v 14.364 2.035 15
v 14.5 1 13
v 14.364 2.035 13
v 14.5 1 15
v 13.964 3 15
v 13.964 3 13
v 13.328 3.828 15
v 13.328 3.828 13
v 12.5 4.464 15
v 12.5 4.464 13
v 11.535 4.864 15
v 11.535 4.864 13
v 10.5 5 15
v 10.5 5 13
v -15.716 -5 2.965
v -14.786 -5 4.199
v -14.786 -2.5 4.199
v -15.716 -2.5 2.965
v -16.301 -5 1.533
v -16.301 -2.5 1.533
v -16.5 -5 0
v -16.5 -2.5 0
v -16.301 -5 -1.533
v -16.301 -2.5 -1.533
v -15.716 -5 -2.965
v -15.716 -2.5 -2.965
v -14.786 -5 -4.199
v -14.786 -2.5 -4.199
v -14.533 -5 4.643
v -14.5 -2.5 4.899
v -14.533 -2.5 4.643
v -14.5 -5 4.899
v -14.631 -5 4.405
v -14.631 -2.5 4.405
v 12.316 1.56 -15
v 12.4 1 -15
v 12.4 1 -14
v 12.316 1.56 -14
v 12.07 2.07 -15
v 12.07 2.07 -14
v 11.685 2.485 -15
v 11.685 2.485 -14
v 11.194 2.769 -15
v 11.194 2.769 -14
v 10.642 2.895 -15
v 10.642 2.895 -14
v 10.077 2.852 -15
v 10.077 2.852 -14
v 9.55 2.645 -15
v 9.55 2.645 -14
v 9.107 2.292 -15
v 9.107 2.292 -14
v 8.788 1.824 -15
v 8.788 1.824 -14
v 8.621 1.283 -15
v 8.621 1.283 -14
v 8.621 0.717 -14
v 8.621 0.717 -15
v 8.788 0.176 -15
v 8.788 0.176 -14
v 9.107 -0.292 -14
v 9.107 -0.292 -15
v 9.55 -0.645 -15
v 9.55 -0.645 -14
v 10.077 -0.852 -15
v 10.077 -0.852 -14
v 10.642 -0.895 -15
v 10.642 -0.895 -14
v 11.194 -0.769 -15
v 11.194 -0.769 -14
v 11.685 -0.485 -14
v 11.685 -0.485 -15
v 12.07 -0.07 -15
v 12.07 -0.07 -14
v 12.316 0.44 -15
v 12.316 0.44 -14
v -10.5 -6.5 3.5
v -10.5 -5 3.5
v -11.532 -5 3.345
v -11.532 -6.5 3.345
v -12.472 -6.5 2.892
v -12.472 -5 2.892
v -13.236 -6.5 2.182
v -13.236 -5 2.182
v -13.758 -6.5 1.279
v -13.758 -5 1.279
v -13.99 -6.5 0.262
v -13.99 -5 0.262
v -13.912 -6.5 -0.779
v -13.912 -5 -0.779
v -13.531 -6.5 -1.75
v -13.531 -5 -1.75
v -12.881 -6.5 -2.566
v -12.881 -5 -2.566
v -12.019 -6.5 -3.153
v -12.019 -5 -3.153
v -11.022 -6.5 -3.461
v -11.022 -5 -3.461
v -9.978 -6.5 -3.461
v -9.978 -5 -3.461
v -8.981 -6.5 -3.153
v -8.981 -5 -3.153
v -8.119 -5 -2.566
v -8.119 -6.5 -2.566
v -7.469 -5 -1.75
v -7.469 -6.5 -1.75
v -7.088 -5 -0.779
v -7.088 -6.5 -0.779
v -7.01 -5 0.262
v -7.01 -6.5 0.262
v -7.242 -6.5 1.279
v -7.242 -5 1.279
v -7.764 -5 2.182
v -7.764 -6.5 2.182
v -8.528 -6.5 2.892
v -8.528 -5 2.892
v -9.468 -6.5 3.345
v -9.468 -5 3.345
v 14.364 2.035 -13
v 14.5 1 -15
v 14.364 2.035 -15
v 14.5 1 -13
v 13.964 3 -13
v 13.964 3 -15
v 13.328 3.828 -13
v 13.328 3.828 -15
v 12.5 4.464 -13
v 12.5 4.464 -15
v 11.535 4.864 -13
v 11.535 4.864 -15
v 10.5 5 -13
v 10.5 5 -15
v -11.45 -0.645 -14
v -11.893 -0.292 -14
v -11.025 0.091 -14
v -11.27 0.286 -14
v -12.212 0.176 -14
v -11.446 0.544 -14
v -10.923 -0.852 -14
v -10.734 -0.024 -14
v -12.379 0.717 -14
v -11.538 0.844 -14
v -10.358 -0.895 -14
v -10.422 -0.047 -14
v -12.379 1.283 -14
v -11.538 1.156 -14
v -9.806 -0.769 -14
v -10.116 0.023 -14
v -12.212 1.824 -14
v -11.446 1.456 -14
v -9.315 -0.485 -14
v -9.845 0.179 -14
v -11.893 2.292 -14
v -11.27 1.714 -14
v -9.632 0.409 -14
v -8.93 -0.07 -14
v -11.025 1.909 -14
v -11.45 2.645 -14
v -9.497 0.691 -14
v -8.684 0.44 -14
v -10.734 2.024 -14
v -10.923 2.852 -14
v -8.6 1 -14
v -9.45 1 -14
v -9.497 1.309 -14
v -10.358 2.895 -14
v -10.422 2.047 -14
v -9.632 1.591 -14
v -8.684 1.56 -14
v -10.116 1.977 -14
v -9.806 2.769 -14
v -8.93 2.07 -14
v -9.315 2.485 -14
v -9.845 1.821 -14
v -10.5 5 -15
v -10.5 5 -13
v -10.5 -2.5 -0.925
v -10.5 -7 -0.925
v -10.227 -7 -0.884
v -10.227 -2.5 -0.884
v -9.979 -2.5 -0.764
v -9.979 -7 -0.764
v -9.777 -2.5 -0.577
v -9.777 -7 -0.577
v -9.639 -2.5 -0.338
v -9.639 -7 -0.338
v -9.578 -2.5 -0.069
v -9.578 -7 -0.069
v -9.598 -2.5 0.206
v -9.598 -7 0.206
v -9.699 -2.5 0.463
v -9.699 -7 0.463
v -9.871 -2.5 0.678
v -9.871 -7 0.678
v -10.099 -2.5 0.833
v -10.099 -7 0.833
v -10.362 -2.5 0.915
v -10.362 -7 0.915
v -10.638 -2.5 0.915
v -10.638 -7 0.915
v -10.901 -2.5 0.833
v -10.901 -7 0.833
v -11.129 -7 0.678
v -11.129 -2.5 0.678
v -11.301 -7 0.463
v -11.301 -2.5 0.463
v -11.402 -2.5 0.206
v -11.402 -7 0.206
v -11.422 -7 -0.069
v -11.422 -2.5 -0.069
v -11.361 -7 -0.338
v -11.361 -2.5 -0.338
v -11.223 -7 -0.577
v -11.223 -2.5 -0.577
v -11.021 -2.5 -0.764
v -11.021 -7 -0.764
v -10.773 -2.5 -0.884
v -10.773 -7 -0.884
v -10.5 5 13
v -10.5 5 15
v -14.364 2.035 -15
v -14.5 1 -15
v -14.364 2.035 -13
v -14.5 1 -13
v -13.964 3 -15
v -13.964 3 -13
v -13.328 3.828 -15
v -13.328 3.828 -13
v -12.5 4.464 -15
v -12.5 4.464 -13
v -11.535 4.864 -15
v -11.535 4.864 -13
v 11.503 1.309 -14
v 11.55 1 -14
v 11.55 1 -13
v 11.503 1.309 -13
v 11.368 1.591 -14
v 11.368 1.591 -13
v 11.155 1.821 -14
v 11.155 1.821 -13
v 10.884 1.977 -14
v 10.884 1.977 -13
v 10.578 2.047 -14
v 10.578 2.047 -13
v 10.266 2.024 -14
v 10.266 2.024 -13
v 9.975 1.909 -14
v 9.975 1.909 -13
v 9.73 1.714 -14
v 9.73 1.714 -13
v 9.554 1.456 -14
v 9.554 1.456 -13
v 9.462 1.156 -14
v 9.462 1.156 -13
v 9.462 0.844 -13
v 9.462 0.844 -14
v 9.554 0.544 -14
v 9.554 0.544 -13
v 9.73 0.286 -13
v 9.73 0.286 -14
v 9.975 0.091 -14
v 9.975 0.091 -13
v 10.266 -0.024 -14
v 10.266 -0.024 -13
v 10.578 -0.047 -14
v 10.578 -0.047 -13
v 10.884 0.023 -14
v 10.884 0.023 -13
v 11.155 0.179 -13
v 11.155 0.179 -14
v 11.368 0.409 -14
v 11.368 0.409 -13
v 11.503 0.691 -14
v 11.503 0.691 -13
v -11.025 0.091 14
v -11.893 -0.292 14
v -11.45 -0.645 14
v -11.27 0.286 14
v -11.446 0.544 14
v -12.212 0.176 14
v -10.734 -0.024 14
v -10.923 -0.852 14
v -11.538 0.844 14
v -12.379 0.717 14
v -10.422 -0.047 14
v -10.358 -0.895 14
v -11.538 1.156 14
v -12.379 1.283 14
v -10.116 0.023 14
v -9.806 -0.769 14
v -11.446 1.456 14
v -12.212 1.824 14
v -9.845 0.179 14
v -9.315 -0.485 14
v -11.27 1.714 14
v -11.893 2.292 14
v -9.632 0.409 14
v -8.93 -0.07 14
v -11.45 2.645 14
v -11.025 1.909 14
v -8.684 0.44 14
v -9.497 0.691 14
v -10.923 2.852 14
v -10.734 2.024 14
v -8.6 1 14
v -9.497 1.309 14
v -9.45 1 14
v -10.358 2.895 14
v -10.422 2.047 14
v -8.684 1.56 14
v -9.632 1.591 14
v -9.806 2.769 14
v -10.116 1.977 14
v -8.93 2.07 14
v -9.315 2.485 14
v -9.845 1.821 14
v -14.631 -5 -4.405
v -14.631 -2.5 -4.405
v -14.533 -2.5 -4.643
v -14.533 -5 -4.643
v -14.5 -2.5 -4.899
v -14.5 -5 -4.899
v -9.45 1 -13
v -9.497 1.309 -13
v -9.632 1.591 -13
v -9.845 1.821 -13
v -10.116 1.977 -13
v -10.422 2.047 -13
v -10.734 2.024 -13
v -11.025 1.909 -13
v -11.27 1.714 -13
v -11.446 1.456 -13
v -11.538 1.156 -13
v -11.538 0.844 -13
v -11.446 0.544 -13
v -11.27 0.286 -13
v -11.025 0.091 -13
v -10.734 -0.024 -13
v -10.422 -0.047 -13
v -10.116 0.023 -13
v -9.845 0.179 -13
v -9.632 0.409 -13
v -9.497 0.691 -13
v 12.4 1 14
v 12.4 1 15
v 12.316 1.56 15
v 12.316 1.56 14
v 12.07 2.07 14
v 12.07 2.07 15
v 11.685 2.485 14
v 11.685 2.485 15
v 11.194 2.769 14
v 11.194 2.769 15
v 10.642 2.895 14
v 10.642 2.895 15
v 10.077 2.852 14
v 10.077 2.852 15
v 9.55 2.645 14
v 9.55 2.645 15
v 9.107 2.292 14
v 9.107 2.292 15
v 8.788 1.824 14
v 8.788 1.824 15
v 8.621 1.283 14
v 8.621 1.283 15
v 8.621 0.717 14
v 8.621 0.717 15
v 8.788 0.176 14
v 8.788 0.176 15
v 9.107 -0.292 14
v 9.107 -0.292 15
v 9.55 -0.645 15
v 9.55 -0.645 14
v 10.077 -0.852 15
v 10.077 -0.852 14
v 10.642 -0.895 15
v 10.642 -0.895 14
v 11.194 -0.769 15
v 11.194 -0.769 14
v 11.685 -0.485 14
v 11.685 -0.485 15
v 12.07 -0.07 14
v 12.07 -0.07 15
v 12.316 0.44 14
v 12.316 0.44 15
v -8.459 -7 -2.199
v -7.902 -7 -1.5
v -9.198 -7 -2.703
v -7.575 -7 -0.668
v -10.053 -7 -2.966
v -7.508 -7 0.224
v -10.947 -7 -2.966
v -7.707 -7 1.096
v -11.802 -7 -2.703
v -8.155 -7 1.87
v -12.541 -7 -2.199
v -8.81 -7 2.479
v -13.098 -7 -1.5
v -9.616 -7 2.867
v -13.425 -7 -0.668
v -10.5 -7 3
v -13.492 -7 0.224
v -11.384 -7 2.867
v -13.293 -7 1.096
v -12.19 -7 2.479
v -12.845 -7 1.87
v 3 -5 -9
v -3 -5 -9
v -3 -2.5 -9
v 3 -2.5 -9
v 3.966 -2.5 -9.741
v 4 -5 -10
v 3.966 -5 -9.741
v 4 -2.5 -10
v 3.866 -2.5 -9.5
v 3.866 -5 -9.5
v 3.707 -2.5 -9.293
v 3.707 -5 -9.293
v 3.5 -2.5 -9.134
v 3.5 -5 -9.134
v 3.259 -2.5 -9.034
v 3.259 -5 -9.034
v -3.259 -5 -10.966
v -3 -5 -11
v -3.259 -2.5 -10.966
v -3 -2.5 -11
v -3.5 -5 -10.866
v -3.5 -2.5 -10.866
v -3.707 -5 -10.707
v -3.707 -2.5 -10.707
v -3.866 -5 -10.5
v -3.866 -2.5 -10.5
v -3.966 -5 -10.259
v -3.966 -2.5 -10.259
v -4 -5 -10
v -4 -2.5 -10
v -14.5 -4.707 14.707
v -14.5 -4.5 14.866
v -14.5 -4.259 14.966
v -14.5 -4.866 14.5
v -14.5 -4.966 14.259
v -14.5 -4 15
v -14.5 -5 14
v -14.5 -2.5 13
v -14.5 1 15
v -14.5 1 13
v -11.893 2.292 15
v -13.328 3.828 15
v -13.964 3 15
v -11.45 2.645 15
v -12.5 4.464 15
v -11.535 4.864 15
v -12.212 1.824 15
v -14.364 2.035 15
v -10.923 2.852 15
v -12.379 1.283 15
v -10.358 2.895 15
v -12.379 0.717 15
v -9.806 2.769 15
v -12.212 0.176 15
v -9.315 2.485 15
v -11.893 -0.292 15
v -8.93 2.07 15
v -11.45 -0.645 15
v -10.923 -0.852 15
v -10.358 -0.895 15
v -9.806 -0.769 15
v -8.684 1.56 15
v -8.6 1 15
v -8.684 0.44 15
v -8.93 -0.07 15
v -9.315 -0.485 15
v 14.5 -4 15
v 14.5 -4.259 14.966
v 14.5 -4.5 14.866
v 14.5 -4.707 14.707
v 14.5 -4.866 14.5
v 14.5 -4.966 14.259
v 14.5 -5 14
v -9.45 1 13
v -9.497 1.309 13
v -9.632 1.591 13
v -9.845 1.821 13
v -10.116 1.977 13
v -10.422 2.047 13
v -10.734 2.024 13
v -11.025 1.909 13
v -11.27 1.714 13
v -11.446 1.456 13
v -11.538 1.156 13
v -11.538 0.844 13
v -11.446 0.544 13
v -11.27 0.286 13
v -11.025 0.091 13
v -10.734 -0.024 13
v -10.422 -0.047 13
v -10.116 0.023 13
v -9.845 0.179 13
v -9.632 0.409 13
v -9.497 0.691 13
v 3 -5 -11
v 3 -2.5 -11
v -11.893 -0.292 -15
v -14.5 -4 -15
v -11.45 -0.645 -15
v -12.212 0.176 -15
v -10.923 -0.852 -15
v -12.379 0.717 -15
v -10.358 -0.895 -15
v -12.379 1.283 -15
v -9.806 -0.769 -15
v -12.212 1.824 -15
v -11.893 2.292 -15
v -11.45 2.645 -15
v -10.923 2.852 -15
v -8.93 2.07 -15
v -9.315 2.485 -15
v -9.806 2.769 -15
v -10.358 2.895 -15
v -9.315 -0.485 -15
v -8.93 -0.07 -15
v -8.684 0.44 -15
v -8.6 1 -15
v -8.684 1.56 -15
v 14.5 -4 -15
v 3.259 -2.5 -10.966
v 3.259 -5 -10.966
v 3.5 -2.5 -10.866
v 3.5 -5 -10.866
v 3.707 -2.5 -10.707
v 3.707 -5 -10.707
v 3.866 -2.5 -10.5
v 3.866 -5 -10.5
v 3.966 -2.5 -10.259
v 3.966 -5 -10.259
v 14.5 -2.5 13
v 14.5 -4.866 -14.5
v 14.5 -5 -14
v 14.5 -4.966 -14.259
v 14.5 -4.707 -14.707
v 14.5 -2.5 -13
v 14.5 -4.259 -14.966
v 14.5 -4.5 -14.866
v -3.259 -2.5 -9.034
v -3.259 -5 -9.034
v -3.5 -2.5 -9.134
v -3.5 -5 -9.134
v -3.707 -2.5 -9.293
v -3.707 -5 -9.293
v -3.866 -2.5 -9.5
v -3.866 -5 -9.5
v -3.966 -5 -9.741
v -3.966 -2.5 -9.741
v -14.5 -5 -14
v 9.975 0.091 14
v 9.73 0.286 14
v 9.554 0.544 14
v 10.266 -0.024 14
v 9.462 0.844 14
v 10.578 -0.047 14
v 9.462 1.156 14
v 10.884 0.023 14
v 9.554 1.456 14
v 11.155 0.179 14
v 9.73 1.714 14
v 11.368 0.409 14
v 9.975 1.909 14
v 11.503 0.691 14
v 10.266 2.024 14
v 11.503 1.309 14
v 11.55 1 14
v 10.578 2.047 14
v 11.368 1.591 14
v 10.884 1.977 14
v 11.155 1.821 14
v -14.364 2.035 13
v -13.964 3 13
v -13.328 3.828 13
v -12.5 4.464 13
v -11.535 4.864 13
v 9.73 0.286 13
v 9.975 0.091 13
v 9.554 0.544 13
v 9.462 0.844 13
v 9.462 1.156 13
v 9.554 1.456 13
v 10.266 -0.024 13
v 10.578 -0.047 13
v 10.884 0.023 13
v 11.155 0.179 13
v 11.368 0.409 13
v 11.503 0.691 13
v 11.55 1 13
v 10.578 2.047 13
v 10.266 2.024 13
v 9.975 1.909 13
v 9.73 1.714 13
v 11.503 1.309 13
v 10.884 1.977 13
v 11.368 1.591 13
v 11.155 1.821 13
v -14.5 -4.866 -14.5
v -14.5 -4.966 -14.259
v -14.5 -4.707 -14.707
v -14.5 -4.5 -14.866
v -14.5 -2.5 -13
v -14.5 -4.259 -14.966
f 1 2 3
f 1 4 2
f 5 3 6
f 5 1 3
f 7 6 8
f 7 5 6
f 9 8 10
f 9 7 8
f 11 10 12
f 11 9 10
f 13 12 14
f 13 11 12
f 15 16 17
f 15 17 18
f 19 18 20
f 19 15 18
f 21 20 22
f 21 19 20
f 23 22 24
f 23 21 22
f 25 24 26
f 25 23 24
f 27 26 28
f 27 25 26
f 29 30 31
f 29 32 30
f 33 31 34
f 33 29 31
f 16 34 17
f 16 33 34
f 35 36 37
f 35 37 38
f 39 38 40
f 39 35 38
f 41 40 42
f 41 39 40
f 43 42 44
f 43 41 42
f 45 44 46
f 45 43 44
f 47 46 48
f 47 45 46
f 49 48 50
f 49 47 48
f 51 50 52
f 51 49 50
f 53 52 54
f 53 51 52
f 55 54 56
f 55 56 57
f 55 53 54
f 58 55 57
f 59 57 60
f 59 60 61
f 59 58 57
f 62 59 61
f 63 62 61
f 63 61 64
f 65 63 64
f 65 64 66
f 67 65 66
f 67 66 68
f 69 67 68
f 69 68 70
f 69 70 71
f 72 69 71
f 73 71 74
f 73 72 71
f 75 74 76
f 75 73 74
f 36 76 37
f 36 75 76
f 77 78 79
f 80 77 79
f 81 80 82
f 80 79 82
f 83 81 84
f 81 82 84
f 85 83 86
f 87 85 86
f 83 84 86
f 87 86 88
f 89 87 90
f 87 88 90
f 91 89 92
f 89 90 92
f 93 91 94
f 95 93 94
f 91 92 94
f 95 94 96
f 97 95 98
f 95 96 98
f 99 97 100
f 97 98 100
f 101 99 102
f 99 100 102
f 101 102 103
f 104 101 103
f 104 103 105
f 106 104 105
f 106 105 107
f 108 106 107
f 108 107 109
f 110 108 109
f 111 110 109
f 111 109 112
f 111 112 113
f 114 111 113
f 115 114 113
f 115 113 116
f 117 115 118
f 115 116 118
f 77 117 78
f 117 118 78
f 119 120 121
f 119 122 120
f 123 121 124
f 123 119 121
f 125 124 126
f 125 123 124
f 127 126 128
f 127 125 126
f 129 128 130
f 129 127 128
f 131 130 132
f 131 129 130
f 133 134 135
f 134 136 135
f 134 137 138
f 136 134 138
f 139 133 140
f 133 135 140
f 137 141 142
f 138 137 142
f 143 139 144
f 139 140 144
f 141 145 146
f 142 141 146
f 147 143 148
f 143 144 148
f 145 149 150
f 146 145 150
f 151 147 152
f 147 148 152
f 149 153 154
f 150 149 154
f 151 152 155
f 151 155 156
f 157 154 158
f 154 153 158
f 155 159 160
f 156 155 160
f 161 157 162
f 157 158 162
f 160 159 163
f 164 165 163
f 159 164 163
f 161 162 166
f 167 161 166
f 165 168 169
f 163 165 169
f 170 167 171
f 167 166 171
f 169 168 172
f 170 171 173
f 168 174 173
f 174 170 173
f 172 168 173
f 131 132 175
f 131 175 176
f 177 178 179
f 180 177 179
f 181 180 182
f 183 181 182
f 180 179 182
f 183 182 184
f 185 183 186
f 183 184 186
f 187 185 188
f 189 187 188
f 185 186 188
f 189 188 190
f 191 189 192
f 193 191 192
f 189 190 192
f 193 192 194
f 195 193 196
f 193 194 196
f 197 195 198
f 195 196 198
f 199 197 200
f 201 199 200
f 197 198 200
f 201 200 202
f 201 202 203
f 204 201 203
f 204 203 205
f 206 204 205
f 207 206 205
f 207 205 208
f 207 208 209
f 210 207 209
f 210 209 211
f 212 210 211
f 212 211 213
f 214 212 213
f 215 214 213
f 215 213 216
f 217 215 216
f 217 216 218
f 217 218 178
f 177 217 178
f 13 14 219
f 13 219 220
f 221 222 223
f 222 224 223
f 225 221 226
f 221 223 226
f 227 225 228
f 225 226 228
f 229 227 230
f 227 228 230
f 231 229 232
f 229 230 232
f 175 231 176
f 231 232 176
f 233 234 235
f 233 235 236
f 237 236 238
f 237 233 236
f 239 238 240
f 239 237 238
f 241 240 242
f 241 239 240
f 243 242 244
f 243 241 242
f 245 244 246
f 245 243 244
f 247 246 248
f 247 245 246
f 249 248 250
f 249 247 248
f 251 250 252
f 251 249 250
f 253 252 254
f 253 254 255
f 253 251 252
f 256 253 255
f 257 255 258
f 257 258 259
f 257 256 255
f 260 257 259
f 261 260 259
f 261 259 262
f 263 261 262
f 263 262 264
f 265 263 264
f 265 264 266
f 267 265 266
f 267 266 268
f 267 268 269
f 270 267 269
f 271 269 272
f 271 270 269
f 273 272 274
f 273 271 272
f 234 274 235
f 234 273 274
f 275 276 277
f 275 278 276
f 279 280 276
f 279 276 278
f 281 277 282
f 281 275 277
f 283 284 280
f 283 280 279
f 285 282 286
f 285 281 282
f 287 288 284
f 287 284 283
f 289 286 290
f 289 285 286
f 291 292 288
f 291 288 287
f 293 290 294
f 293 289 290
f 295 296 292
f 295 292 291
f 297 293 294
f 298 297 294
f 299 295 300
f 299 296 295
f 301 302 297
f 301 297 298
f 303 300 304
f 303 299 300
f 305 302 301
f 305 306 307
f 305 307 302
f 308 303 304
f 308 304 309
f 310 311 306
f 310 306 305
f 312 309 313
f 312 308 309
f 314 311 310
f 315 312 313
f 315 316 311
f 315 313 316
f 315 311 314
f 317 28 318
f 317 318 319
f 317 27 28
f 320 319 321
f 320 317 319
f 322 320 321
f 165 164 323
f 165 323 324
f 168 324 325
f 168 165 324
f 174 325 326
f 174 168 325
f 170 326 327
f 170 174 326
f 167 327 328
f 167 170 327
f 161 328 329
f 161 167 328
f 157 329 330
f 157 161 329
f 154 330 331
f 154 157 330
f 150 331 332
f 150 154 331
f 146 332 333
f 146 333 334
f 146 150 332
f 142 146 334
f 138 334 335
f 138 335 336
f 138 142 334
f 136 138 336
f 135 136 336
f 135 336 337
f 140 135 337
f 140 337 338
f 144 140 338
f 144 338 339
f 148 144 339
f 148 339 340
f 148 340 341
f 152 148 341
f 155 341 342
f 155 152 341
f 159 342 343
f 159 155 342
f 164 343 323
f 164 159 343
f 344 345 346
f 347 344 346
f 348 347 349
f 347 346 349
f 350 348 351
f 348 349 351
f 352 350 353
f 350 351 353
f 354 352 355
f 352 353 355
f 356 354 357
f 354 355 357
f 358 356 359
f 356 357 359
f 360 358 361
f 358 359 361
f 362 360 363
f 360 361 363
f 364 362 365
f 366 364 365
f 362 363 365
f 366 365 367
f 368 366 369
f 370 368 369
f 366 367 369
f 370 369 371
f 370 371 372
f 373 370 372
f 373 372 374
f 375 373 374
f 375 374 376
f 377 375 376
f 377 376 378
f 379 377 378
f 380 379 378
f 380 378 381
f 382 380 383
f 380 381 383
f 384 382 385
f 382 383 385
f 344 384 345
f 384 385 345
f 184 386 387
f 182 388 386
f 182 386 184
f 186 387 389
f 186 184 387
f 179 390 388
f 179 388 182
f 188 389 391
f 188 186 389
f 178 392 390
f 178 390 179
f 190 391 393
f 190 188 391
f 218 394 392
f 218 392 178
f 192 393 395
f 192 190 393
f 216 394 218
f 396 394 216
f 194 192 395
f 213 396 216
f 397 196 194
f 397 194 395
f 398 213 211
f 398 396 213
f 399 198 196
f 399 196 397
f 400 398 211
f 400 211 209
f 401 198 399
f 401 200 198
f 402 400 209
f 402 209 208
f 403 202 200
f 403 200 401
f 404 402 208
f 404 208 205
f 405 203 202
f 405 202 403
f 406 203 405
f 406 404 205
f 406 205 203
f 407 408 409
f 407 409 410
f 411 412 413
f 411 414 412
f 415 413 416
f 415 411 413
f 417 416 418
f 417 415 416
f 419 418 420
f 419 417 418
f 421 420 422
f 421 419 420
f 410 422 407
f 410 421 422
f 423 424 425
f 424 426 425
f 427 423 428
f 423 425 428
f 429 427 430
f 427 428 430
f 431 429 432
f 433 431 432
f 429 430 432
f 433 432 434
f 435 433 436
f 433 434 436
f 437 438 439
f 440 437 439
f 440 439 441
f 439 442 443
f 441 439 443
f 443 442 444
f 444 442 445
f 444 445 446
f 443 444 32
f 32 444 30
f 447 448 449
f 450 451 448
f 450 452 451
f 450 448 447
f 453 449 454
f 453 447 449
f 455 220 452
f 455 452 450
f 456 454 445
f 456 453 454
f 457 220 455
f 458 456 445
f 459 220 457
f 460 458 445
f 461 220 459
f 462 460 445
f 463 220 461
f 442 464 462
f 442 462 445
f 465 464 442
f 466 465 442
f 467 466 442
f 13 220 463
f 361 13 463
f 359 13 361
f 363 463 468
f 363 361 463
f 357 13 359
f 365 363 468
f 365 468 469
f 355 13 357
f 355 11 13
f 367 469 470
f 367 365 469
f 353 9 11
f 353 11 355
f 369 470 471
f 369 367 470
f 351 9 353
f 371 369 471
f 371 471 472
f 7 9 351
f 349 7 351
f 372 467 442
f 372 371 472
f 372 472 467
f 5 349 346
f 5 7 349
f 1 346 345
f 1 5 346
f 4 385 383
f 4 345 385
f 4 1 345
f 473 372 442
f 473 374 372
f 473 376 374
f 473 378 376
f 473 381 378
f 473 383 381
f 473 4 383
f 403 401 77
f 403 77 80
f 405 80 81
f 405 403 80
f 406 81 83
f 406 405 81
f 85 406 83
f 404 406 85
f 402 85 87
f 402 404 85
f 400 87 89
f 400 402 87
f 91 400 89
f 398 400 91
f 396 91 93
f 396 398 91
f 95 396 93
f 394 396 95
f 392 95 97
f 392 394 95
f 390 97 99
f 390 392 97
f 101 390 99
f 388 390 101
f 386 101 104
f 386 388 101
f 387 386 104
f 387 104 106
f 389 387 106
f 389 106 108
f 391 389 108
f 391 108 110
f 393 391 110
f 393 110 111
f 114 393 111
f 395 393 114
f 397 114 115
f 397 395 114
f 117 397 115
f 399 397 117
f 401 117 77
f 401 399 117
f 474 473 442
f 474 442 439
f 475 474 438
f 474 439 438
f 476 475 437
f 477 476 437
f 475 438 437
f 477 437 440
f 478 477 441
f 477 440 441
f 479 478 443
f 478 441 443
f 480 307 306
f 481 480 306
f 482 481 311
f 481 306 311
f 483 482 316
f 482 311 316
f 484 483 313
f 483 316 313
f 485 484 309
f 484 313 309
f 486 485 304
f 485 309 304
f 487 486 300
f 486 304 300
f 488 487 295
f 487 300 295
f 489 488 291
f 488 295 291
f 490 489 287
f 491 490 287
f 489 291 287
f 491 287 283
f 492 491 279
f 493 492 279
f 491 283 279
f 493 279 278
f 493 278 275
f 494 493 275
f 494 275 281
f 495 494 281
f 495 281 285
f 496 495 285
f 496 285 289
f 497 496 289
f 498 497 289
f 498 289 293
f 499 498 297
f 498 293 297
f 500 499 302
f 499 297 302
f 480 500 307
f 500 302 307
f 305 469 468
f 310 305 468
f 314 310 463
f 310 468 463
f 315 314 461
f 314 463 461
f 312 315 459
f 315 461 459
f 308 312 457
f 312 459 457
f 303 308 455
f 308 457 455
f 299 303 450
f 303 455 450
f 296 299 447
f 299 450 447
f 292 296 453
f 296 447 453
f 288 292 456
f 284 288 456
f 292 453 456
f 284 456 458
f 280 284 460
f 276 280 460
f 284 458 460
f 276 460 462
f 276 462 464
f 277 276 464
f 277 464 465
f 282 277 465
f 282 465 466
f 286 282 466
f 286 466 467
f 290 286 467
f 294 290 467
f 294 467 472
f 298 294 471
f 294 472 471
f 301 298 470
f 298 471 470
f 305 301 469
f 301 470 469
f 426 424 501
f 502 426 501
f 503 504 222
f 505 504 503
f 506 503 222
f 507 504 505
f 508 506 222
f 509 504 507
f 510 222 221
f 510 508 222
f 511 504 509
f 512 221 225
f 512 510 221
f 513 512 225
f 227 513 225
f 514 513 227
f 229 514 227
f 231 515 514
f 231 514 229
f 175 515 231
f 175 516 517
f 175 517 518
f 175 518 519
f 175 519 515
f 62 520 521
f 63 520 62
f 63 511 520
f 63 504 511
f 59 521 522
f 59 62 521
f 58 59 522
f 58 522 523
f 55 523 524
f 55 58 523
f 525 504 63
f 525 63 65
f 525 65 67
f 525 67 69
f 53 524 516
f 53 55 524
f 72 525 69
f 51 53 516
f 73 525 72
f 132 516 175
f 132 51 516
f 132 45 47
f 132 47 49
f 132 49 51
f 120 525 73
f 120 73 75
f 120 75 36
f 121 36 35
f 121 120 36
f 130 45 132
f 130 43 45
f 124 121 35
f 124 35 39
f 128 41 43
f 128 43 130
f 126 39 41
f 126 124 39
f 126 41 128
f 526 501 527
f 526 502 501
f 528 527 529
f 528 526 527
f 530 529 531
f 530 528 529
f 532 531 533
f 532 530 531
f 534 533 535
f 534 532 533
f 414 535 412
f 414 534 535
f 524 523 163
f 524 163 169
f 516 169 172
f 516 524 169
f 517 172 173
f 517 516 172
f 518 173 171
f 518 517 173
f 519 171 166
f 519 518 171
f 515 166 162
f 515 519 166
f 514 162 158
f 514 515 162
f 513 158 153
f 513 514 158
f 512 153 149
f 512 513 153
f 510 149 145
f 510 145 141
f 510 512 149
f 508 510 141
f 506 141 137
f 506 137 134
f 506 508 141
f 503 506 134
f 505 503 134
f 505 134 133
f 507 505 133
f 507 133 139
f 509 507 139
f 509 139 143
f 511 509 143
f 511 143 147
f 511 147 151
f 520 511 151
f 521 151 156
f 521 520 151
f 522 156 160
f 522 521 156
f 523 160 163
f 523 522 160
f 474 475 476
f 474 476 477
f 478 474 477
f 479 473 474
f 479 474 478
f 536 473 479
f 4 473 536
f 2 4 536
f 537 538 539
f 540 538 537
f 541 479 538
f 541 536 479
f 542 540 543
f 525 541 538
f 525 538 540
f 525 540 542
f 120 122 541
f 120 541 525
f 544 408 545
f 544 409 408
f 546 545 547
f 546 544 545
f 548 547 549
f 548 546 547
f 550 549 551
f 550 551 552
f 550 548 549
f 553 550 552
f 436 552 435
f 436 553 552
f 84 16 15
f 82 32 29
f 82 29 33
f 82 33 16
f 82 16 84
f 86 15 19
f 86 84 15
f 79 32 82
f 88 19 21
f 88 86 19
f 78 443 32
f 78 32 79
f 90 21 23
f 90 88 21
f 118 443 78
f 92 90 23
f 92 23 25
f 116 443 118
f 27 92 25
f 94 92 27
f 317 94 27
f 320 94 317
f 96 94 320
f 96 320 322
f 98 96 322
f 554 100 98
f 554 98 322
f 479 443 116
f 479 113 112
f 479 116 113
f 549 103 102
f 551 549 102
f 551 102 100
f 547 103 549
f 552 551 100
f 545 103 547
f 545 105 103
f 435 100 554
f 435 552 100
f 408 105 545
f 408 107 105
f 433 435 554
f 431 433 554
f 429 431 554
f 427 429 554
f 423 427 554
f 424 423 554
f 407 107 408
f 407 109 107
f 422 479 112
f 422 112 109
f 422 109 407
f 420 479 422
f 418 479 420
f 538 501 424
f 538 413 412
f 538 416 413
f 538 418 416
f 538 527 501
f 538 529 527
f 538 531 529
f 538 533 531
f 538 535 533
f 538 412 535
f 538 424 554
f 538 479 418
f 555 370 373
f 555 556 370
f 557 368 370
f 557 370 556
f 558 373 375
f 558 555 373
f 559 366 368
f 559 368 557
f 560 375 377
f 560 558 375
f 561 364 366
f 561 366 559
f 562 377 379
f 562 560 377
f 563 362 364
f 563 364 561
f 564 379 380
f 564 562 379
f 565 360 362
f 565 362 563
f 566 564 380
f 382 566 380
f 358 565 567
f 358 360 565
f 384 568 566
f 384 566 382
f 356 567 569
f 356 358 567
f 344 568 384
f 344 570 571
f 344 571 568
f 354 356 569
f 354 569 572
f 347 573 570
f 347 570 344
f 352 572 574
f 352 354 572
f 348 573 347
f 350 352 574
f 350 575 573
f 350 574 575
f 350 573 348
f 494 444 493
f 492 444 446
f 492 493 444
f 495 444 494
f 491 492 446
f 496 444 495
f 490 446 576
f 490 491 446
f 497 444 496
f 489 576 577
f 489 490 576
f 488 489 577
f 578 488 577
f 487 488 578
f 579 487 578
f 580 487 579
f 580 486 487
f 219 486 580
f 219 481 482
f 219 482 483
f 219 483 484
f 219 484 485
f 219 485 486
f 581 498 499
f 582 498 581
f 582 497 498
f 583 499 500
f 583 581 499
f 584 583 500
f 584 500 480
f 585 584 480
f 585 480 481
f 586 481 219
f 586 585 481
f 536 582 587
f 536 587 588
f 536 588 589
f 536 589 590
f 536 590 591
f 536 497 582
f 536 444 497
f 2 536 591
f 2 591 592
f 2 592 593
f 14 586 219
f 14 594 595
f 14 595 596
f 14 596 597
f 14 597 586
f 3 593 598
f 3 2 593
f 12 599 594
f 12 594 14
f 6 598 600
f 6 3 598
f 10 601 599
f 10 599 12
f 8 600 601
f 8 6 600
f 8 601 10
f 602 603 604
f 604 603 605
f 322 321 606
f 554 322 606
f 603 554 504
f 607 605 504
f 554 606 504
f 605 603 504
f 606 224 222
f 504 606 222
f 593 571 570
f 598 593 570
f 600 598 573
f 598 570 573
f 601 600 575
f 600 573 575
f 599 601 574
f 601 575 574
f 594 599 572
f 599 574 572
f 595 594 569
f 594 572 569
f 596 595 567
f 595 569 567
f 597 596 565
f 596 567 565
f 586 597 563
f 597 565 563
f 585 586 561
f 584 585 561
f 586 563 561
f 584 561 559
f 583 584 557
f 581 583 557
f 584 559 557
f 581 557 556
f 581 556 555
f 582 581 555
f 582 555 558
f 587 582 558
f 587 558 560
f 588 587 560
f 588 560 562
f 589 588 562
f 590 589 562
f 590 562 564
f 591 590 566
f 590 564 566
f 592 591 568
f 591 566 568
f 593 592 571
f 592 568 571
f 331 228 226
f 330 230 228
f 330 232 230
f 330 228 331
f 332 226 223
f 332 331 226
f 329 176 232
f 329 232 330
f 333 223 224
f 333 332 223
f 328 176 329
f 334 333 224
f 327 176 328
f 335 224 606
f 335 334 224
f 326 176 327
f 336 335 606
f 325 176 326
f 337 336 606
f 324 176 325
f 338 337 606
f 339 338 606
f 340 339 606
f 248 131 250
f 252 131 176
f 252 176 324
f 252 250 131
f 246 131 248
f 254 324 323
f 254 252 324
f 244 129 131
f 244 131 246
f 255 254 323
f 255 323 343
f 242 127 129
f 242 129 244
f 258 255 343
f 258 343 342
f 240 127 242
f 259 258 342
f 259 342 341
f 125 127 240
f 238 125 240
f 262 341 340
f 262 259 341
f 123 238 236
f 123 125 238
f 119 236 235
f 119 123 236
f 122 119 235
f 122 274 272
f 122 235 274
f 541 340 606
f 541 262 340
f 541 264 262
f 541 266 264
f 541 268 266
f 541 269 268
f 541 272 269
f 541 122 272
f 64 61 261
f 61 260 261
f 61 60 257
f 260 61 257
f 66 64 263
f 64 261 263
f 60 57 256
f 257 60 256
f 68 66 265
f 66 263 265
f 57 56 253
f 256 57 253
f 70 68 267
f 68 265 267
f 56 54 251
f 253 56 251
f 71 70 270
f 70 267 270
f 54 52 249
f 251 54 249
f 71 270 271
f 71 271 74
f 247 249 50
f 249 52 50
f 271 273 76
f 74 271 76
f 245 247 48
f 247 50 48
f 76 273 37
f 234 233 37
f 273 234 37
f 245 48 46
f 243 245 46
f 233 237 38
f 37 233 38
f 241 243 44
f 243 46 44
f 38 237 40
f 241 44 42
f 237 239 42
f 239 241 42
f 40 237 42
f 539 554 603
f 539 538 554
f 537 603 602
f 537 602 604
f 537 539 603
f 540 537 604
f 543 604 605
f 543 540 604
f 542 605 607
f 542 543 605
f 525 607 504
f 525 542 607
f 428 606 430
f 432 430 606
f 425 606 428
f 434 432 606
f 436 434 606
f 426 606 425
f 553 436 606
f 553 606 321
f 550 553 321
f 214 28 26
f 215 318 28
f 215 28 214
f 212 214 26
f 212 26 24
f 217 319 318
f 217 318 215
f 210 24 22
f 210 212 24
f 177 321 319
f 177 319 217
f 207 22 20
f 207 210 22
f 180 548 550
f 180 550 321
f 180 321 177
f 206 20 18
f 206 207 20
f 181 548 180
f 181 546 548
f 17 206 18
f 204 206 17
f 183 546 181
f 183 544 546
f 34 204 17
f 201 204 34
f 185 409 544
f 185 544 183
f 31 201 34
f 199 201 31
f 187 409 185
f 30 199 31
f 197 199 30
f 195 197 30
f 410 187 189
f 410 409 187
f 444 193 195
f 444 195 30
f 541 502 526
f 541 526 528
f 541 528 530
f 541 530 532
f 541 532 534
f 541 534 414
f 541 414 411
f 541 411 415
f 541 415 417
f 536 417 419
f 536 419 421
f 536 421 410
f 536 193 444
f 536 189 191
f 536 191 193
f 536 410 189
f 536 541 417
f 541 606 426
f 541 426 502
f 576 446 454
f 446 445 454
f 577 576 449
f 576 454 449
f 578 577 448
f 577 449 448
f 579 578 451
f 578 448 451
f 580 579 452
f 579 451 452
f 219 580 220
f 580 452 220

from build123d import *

# Parameters (mm, degrees)
EXTRUDE_1_DEPTH              = 14.5
HOLE_START                   = -15
HOLE_WIZARD_M2_1_OUTLINE_R   = 1.9
HOLE_WIZARD_M2_1_DEPTH       = 1
HOLE_START_2                 = -14
HOLE_WIZARD_M2_1_2_OUTLINE_R = 1.05
HOLE_WIZARD_M2_1_2_DEPTH     = 1
SKETCH_5_R                   = 6
EXTRUDE_2_DEPTH              = 2.5
SKETCH_6_R                   = 3.5
EXTRUDE_3_DEPTH              = 2
CHAMFER_1_SIZE               = 0.5
CUT_EXTRUDE_1_REACH          = 27.323
SKETCH_7_R                   = 0.925
FILLET_1_R                   = 4
FILLET_2_R                   = 1
CUT_EXTRUDE_2_REACH          = 26.439
SKETCH_8_W                   = 8
SKETCH_8_H                   = 2
FILLET_3_R                   = 1


# Read off the part's stored shape, not the designer's step: M2 丸平ねじ用座ぐり穴1
with BuildPart() as part:
    # ｽｹｯﾁ1 → ﾎﾞｽ - 押し出し1 (new, symmetric)
    with BuildSketch(Plane(origin=(0, 0, 0), x_dir=(0, 0, -1), z_dir=(1, 0, 0))):
        Polygon((-15, -5), (15, -5), (15, 5), (13, 5), (13, -2.5), (-13, -2.5), (-13, 5), (-15, 5), align=None)
    extrude(amount=EXTRUDE_1_DEPTH, both=True)

    # M2 丸平ねじ用座ぐり穴1 outline → M2 丸平ねじ用座ぐり穴1 (cut)
    with BuildSketch(Plane.XY.offset(HOLE_START)):
        with Locations((-10.5, 1)):
            Circle(HOLE_WIZARD_M2_1_OUTLINE_R)
        with Locations((10.5, 1)):
            Circle(HOLE_WIZARD_M2_1_OUTLINE_R)
    hole_wizard_m2_1 = extrude(amount=HOLE_WIZARD_M2_1_DEPTH, mode=Mode.SUBTRACT)

    # Hole Wizard M2 _1 2 outline → Hole Wizard M2 _1 2 (cut)
    with BuildSketch(Plane.XY.offset(HOLE_START_2)):
        with Locations((-10.5, 1)):
            Circle(HOLE_WIZARD_M2_1_2_OUTLINE_R)
        with Locations((10.5, 1)):
            Circle(HOLE_WIZARD_M2_1_2_OUTLINE_R)
    hole_wizard_m2_1_2 = extrude(amount=HOLE_WIZARD_M2_1_2_DEPTH, mode=Mode.SUBTRACT)

    # ｽｹｯﾁ5 → ﾎﾞｽ - 押し出し2 (add)
    with BuildSketch(Plane.XZ.offset(5)):
        with Locations((-10.5, 0)):
            Circle(SKETCH_5_R)
    extrude(amount=-EXTRUDE_2_DEPTH)

    # ｽｹｯﾁ6 → ﾎﾞｽ - 押し出し3 (add)
    with BuildSketch(Plane.XZ.offset(5)):
        with Locations(Location((-10.5, 0, 0), (0, 0, 90))):
            Circle(SKETCH_6_R)
    extrude(amount=EXTRUDE_3_DEPTH)

    # 面取り1
    chamfer_1_edges = [part.edges().sort_by_distance(p)[0] for p in [
        (-10.5, -7, -3.5),
    ]]
    chamfer(chamfer_1_edges, length=CHAMFER_1_SIZE)

    # ｽｹｯﾁ7 → ｶｯﾄ - 押し出し1 (cut, up to next)
    with BuildSketch(Plane.XZ.offset(7), mode=Mode.PRIVATE) as cut_extrude_1_sk1:
        with Locations(Location((-10.5, 0, 0), (0, 0, 270))):
            Circle(SKETCH_7_R)
    cut_extrude_1_tool1 = extrude(cut_extrude_1_sk1.sketch, amount=-CUT_EXTRUDE_1_REACH, mode=Mode.PRIVATE) & part.part
    add(cut_extrude_1_tool1.solids().sort_by_distance((-10.5, -7, 0))[0], mode=Mode.SUBTRACT)

    # ﾌｨﾚｯﾄ1
    fillet_1_edges = [part.edges().sort_by_distance(p)[0] for p in [
        (-14.5, 5, 14),
        (14.5, 5, -14),
        (14.5, 5, 14),
        (-14.5, 5, -14),
    ]]
    fillet(fillet_1_edges, radius=FILLET_1_R)

    # ﾌｨﾚｯﾄ2
    fillet_2_edges = [part.edges().sort_by_distance(p)[0] for p in [
        (0, -5, -15),
        (0, -5, 15),
        (-14.5, -3.75, -4.472135955),
        (-14.5, -3.75, 4.472135955),
    ]]
    fillet(fillet_2_edges, radius=FILLET_2_R)

    # ｽｹｯﾁ8 → ｶｯﾄ - 押し出し2 (cut, up to next)
    with BuildSketch(Plane.XZ.offset(5), mode=Mode.PRIVATE) as cut_extrude_2_sk1:
        with Locations((0, -10)):
            Rectangle(SKETCH_8_W, SKETCH_8_H)
    cut_extrude_2_tool1 = extrude(cut_extrude_2_sk1.sketch, amount=-CUT_EXTRUDE_2_REACH, mode=Mode.PRIVATE) & part.part
    add(cut_extrude_2_tool1.solids().sort_by_distance((0, -5, -10))[0], mode=Mode.SUBTRACT)

    # ﾌｨﾚｯﾄ3
    fillet_3_edges = [part.edges().sort_by_distance(p)[0] for p in [
        (4, -3.75, -9),
        (-4, -3.75, -9),
        (-4, -3.75, -11),
        (4, -3.75, -11),
    ]]
    fillet(fillet_3_edges, radius=FILLET_3_R - 0.0001)  # a hair under: the kernel refuses the full size

    # ﾐﾗｰ1: M2 丸平ねじ用座ぐり穴1, Hole Wizard M2 _1 2 across plane
    add(hole_wizard_m2_1.mirror(Plane.XY), mode=Mode.SUBTRACT)
    add(hole_wizard_m2_1_2.mirror(Plane.XY), mode=Mode.SUBTRACT)


solid = part.part
